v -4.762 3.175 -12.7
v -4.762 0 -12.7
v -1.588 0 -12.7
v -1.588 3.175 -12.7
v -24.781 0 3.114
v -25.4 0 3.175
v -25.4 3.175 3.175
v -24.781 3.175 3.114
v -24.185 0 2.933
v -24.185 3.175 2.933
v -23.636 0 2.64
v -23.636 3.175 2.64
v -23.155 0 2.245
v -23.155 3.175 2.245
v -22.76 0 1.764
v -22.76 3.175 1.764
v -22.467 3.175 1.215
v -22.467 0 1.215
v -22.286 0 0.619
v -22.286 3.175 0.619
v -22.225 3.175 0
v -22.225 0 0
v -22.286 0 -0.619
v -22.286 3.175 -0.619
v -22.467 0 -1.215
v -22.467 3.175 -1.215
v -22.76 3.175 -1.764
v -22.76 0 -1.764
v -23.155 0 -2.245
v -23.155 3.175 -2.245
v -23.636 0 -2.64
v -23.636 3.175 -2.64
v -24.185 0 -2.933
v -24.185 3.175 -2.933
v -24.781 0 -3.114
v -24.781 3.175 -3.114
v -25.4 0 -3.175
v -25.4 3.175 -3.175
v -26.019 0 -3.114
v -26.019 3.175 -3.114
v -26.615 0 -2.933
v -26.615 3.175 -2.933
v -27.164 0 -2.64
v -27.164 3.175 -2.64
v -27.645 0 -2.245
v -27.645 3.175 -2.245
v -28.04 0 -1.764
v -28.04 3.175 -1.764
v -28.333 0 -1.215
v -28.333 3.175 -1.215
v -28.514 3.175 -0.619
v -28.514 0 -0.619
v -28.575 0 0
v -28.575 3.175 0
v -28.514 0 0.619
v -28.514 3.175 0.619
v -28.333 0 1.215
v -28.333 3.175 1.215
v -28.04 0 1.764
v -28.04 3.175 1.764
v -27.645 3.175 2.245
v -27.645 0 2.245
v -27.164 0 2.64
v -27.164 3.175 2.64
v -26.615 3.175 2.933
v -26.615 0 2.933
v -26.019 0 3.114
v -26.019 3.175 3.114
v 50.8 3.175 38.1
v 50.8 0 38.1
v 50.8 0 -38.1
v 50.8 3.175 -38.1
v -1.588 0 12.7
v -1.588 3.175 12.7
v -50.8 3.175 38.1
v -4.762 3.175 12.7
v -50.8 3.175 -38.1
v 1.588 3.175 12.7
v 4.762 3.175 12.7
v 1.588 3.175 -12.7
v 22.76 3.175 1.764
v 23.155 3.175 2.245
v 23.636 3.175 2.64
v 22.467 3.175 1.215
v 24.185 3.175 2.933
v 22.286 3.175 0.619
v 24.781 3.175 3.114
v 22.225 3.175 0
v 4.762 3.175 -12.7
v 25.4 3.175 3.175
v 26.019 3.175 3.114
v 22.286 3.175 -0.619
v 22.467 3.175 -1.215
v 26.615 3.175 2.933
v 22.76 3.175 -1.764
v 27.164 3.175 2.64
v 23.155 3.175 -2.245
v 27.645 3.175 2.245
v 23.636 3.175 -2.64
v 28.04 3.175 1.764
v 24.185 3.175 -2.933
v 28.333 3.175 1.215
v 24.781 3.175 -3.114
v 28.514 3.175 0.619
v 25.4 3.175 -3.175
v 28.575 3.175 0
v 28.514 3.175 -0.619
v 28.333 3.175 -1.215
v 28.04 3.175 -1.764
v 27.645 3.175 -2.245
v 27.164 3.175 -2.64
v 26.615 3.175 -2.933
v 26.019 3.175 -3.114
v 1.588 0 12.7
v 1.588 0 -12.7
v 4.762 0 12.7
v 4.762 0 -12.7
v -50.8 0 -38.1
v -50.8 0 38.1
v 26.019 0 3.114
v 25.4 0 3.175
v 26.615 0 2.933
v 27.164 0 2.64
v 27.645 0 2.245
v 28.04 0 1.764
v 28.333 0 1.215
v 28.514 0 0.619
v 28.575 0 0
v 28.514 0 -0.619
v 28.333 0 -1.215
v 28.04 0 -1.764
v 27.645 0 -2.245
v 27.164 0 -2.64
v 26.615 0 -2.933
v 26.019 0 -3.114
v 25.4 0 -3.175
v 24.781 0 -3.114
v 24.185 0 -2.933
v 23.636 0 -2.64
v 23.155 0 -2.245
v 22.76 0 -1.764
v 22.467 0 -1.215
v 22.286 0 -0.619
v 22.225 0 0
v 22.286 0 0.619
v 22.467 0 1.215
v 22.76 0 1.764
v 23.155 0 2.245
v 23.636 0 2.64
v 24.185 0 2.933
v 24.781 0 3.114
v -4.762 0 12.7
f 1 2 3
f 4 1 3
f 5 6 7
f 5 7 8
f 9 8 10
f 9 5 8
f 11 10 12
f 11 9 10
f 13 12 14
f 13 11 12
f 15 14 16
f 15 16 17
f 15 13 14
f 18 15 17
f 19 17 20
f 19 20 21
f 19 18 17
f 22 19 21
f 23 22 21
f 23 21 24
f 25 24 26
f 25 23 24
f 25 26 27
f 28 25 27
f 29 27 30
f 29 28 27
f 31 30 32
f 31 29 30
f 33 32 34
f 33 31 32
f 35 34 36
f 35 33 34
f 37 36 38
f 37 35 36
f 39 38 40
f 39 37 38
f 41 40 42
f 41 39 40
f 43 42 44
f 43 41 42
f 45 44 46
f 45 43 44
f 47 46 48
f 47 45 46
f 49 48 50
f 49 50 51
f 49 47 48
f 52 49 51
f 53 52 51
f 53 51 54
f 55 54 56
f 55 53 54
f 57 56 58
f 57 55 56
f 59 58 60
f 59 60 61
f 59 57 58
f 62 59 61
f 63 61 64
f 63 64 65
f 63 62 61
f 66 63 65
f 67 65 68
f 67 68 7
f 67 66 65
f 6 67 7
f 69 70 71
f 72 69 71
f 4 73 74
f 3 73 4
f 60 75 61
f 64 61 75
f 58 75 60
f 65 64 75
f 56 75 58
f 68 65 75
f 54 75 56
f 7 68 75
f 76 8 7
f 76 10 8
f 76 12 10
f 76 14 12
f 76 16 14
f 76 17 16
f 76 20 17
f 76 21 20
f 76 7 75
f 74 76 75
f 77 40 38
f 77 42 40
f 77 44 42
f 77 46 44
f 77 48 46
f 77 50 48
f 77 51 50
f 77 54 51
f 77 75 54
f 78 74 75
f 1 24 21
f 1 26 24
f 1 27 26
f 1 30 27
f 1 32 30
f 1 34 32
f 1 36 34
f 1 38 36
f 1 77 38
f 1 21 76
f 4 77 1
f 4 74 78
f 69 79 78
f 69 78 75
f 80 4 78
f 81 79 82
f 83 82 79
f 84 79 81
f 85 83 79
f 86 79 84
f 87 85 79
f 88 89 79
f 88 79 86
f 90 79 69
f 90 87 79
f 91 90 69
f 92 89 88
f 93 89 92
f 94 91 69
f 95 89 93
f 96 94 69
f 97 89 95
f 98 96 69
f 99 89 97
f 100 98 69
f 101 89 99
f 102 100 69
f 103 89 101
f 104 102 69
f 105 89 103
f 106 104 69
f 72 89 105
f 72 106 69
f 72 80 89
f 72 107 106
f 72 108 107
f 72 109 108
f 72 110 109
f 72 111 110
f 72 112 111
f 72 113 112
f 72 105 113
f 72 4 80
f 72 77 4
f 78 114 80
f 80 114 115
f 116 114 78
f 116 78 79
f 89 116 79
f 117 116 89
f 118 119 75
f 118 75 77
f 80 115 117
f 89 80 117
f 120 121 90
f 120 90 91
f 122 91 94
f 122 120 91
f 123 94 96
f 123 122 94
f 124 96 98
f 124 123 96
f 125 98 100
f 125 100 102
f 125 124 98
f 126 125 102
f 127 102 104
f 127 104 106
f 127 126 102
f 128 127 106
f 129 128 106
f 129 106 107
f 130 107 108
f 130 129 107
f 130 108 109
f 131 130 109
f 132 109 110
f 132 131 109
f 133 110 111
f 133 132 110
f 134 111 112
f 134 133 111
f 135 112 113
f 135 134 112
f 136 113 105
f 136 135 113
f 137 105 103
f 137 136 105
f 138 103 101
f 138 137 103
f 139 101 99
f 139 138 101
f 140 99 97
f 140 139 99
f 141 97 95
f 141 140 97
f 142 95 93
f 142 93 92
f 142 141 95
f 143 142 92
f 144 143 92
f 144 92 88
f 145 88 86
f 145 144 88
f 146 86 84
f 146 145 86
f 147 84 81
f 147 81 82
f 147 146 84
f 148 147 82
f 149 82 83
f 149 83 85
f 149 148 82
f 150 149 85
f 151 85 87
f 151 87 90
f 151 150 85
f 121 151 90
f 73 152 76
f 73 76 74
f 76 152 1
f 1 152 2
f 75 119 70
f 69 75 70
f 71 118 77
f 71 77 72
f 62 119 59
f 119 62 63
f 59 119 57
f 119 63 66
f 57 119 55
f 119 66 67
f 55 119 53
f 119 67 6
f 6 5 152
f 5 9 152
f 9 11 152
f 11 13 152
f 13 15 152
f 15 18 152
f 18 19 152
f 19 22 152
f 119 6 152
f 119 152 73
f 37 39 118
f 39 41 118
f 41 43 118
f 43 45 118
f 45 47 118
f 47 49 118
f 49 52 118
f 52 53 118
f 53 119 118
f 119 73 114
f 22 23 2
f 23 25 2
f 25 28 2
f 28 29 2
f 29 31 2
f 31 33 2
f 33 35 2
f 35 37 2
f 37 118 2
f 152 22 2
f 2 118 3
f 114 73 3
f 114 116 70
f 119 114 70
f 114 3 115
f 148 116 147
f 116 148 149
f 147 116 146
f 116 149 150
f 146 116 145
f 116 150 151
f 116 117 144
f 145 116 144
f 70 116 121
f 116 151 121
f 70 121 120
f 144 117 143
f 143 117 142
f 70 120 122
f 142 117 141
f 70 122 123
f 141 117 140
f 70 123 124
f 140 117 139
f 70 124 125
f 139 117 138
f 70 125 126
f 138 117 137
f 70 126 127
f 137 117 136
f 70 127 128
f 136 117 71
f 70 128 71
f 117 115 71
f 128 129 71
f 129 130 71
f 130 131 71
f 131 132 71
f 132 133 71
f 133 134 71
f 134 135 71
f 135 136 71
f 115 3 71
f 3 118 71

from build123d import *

# Parameters (mm, degrees)
SKETCH2_W           = 101.6
SKETCH2_H           = 76.2
SKETCH2_R           = 3.175
SKETCH2_W_2         = 3.175
SKETCH2_H_2         = 25.4
BOSS_EXTRUDE1_DEPTH = 3.175


with BuildPart() as part:
    # Sketch2 → Boss-Extrude1 (new body)
    with BuildSketch(Plane(origin=(0, 0, 0), x_dir=(1, 0, 0), z_dir=(0, 1, 0))):
        Rectangle(SKETCH2_W, SKETCH2_H)
        with Locations(Location((25.4, 0, 0), (0, 0, 270))):
            Circle(SKETCH2_R, mode=Mode.SUBTRACT)
        with Locations(Location((-25.4, 0, 0), (0, 0, 270))):
            Circle(SKETCH2_R, mode=Mode.SUBTRACT)
        with Locations((3.175, 0)):
            Rectangle(SKETCH2_W_2, SKETCH2_H_2, mode=Mode.SUBTRACT)
        with Locations((-3.175, 0)):
            Rectangle(SKETCH2_W_2, SKETCH2_H_2, mode=Mode.SUBTRACT)
    extrude(amount=BOSS_EXTRUDE1_DEPTH)


solid = part.part
